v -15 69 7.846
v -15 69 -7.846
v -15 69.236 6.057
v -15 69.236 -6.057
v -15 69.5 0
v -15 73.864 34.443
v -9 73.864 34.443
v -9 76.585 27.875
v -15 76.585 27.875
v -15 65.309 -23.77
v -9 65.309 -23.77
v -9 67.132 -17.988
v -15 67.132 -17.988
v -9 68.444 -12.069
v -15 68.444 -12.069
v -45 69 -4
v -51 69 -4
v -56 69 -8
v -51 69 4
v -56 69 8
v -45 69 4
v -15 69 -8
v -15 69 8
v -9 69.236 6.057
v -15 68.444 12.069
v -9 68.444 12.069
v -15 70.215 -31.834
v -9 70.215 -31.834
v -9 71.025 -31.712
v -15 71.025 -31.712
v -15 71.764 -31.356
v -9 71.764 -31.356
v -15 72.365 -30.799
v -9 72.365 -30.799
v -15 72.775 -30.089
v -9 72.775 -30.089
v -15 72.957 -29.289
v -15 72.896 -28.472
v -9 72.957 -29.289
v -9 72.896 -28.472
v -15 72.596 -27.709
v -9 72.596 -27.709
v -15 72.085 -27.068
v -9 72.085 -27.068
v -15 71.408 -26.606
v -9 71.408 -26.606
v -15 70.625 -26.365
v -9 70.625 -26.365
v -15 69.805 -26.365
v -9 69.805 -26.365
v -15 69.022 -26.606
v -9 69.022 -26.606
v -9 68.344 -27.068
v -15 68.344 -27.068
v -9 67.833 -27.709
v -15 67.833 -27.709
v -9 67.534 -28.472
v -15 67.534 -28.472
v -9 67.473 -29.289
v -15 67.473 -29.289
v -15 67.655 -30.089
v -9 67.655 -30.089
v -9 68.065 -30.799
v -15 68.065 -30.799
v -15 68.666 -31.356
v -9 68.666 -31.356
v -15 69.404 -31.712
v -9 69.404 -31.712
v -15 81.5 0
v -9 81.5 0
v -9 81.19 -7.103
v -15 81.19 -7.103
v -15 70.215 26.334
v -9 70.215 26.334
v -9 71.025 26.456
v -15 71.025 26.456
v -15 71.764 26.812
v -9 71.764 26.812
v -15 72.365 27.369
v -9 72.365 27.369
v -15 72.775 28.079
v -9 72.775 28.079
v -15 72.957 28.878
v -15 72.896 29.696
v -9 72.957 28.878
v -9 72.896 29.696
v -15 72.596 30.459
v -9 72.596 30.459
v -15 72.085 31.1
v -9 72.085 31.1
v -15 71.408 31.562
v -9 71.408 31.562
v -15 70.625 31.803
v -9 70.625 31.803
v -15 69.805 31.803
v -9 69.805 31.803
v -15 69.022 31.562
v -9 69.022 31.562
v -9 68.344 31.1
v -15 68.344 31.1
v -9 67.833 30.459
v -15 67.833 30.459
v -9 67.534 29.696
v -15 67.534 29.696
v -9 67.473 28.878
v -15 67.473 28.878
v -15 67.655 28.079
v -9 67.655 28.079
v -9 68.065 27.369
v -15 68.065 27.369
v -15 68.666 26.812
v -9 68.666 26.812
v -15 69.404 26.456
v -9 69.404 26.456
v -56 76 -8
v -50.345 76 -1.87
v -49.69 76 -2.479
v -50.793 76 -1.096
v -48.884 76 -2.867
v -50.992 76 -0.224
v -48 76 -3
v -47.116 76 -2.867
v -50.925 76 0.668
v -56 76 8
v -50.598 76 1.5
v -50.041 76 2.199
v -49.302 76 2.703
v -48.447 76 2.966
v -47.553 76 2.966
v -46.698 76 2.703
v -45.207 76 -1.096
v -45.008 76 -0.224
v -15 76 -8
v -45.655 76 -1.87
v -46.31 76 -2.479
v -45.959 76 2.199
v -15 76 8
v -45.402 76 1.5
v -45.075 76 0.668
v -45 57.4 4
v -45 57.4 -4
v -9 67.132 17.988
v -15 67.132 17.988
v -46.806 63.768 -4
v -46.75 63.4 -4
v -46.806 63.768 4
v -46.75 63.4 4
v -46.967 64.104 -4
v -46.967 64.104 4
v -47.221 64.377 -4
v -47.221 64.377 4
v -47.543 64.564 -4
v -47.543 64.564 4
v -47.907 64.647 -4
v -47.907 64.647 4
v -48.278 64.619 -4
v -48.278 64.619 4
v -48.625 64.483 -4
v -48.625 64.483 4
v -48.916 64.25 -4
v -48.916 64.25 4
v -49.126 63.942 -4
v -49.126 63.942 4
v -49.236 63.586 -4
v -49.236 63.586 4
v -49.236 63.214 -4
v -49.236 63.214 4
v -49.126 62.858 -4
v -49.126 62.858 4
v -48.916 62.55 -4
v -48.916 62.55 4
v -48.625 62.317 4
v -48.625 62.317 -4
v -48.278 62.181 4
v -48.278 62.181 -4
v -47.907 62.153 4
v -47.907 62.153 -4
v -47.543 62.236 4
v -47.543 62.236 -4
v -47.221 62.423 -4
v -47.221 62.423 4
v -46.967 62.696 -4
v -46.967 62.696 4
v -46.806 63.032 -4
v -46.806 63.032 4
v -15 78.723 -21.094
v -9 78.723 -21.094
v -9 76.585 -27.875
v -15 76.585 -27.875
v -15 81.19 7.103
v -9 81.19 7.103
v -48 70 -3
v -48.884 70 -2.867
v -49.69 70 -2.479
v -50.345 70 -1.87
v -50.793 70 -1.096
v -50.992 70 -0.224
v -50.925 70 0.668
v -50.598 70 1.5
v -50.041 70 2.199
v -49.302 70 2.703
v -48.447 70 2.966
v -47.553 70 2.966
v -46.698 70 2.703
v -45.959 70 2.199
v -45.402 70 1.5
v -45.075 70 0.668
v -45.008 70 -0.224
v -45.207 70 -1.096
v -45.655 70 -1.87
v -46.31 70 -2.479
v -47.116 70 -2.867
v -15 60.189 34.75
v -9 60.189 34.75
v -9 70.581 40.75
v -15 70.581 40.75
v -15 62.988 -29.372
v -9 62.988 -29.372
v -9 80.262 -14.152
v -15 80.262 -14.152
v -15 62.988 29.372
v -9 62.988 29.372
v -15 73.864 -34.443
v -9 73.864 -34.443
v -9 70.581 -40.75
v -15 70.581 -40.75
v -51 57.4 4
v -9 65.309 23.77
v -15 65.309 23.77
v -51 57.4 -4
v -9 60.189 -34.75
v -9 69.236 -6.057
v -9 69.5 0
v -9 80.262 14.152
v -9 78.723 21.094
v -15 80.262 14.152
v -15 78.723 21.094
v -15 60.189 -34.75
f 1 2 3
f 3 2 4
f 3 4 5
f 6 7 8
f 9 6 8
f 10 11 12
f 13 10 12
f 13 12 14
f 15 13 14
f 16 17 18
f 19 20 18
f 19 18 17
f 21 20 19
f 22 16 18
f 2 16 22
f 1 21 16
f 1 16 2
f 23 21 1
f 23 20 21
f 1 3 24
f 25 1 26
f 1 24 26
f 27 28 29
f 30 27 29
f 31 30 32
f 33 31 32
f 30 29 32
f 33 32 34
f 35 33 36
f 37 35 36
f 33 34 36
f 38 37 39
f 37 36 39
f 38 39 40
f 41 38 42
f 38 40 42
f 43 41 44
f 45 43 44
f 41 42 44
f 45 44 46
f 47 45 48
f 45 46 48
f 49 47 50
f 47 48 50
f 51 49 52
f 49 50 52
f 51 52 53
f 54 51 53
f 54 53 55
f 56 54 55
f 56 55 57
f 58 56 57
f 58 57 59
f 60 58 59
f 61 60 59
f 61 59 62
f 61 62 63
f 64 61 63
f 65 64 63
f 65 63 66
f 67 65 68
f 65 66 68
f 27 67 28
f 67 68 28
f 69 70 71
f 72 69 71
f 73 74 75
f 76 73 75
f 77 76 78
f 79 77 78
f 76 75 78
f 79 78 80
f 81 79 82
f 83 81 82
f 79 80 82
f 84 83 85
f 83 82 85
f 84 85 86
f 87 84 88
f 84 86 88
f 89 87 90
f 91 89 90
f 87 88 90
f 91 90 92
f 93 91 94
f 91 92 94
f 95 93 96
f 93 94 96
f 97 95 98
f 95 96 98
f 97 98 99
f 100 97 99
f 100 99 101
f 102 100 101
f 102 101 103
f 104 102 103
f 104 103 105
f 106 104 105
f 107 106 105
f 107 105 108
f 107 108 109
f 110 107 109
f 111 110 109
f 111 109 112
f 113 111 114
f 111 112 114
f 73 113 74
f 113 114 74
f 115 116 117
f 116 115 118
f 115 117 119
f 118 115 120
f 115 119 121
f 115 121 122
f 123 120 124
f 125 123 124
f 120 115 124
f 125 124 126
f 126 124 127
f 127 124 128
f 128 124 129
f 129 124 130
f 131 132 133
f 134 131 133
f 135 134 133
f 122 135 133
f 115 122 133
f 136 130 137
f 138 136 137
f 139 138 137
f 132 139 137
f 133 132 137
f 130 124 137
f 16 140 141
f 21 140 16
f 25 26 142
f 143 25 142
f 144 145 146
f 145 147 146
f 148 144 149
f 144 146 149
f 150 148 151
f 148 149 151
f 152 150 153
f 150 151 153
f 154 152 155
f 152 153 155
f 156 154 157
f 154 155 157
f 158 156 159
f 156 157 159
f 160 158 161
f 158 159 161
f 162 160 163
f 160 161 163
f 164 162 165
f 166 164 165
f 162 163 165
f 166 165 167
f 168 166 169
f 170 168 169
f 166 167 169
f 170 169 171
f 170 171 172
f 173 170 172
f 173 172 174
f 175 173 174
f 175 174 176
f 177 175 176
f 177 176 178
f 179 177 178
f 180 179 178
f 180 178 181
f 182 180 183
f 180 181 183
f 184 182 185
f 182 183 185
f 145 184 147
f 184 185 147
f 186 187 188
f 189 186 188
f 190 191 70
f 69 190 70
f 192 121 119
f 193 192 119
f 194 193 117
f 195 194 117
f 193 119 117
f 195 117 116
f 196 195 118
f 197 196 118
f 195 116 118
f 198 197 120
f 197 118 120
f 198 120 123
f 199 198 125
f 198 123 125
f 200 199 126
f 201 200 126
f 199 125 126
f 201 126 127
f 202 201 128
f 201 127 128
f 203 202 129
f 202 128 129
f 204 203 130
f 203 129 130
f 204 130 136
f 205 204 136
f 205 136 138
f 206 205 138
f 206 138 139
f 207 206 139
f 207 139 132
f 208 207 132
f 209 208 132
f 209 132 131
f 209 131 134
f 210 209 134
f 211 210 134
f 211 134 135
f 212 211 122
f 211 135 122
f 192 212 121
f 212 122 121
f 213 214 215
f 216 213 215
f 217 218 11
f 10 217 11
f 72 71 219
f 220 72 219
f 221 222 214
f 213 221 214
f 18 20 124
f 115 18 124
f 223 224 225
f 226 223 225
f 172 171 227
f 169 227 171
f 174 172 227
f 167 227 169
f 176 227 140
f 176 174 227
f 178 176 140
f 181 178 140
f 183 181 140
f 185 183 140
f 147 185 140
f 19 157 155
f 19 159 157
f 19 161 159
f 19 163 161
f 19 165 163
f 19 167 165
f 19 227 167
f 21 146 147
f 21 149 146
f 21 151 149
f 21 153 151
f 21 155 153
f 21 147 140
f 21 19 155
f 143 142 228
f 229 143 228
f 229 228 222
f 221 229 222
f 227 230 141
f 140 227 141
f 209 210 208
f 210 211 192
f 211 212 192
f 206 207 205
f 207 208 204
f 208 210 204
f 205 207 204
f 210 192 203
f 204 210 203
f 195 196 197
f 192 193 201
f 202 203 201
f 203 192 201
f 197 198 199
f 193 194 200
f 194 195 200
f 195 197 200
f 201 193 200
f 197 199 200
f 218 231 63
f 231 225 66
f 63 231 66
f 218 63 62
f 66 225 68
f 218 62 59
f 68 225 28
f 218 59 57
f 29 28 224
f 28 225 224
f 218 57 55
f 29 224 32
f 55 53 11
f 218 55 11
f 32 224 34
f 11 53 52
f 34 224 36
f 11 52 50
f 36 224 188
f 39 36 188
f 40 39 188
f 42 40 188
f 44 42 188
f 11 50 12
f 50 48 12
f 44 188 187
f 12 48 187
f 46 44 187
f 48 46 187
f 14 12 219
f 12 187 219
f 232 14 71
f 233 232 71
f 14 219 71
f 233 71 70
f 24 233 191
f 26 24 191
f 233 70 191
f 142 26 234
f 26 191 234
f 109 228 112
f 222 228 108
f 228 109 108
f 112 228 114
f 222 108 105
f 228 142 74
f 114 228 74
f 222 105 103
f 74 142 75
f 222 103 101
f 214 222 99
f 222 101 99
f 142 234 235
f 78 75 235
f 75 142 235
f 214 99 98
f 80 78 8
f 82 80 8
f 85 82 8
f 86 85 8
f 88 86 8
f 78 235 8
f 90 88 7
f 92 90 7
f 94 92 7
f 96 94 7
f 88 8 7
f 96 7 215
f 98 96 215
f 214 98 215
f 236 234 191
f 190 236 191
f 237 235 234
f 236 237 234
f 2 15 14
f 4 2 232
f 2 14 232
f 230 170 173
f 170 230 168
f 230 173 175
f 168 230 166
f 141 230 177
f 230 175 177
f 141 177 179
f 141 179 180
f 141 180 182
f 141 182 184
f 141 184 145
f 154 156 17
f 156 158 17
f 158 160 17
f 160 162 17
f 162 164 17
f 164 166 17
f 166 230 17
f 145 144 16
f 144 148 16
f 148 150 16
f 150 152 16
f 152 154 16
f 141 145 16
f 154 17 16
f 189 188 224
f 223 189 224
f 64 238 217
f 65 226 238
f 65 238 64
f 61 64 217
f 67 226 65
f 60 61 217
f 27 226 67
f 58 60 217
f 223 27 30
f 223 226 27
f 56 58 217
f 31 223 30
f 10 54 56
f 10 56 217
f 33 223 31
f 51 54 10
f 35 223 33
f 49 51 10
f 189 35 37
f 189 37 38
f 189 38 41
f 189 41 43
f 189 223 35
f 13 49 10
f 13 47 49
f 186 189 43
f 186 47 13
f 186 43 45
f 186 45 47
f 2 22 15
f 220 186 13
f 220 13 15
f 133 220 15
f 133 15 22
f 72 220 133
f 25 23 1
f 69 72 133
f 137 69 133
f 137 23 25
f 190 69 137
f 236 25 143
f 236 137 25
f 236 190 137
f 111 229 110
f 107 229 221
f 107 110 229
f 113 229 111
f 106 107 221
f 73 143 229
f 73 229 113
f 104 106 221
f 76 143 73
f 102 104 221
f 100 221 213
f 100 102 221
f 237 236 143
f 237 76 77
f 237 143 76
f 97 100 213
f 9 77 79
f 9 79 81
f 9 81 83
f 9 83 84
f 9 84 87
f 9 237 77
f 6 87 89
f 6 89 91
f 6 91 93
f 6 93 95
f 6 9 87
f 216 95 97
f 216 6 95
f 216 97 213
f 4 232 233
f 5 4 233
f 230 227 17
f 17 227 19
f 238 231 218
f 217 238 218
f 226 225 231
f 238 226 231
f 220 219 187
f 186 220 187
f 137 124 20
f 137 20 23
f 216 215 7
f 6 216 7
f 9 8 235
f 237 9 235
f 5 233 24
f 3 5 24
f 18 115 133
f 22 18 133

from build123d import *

# Parameters (mm, degrees)
FOOT_DEPTH                     = 6
RISER_SKETCH_W                 = 41
RISER_SKETCH_H                 = 7
RISER_DEPTH                    = 8
TAB_SKETCH_W                   = 6
TAB_SKETCH_H                   = 11.6
PUSHROD_TAB_DEPTH              = 4
PIN_HOLE_SKETCH_W              = 3
PIN_HOLE_SKETCH_H              = 7
BALL_JOINT_HOLE_SKETCH_R       = 1.25
BALL_JOINT_HOLE_DEPTH          = 5
FOOT_BOLT_HOLE_22_5_SKETCH_R   = 2.75
FOOT_BOLT_HOLE_22_5_DEPTH      = 6
FOOT_BOLT_HOLE_22_5_SKETCH_2_R = 2.75
FOOT_BOLT_HOLE_22_5_2_DEPTH    = 6


with BuildPart() as part:
    # Foot Sketch → Foot (new body)
    with BuildSketch(Plane(origin=(-9, 0, 0), x_dir=(0, 0, -1), z_dir=(1, 0, 0))):
        Polygon((-40.75, 70.581070408), (-34.443388332, 73.864084643), (-27.874641681, 76.584948594), (-21.093752176, 78.722954843), (-14.15232648, 80.26183187), (-7.103193034, 81.189867894), (0, 81.5), (7.103193034, 81.189867894), (14.15232648, 80.26183187), (21.093752176, 78.722954843), (27.874641681, 76.584948594), (34.443388332, 73.864084643), (40.75, 70.581070408), (34.75, 60.188765563), (29.371969191, 62.988391199), (23.770399961, 65.308637145), (17.987923635, 67.131844927), (12.068548348, 68.444138834), (6.057324121, 69.235531517), (0, 69.5), (-6.057324121, 69.235531517), (-12.068548348, 68.444138834), (-17.987923635, 67.131844927), (-23.770399961, 65.308637145), (-29.371969191, 62.988391199), (-34.75, 60.188765563), align=None)
    extrude(amount=-FOOT_DEPTH)

    # Riser Sketch → Riser (add, symmetric)
    with BuildSketch(Plane.XY):
        with Locations((-35.5, 72.5)):
            Rectangle(RISER_SKETCH_W, RISER_SKETCH_H)
    extrude(amount=RISER_DEPTH, both=True)

    # Tab Sketch → Pushrod Tab (add, symmetric)
    with BuildSketch(Plane.XY):
        with Locations((-48, 63.2)):
            Rectangle(TAB_SKETCH_W, TAB_SKETCH_H)
    extrude(amount=PUSHROD_TAB_DEPTH, both=True)

    # Pin Hole Sketch → Pin Hole (revolve, cut)
    with BuildSketch(Plane.XY, mode=Mode.PRIVATE) as pin_hole_sk:
        with Locations((-46.5, 73.5)):
            Rectangle(PIN_HOLE_SKETCH_W, PIN_HOLE_SKETCH_H)
    revolve(pin_hole_sk.sketch.rotate(Axis((-48, 59, 0), (0, 1, 0)), 90), axis=Axis((-48, 59, 0), (0, 1, 0)), mode=Mode.SUBTRACT)

    # Ball Joint Hole Sketch → Ball Joint Hole (cut, symmetric)
    with BuildSketch(Plane.XY):
        with Locations((-48, 63.4)):
            Circle(BALL_JOINT_HOLE_SKETCH_R)
    extrude(amount=BALL_JOINT_HOLE_DEPTH, both=True, mode=Mode.SUBTRACT)

    # Foot Bolt Hole _22.5 Sketch → Foot Bolt Hole _22.5 (cut)
    with BuildSketch(Plane(origin=(-9, 0, 0), x_dir=(0, 0, -1), z_dir=(1, 0, 0))):
        with Locations((29.08394086, 70.214844471)):
            Circle(FOOT_BOLT_HOLE_22_5_SKETCH_R)
    extrude(amount=-FOOT_BOLT_HOLE_22_5_DEPTH, mode=Mode.SUBTRACT)

    # Foot Bolt Hole -22.5 Sketch 2 → Foot Bolt Hole -22.5 2 (cut)
    with BuildSketch(Plane(origin=(-9, 0, 0), x_dir=(0, 0, -1), z_dir=(1, 0, 0))):
        with Locations((-29.08394086, 70.214844471)):
            Circle(FOOT_BOLT_HOLE_22_5_SKETCH_2_R)
    extrude(amount=-FOOT_BOLT_HOLE_22_5_2_DEPTH, mode=Mode.SUBTRACT)


solid = part.part
